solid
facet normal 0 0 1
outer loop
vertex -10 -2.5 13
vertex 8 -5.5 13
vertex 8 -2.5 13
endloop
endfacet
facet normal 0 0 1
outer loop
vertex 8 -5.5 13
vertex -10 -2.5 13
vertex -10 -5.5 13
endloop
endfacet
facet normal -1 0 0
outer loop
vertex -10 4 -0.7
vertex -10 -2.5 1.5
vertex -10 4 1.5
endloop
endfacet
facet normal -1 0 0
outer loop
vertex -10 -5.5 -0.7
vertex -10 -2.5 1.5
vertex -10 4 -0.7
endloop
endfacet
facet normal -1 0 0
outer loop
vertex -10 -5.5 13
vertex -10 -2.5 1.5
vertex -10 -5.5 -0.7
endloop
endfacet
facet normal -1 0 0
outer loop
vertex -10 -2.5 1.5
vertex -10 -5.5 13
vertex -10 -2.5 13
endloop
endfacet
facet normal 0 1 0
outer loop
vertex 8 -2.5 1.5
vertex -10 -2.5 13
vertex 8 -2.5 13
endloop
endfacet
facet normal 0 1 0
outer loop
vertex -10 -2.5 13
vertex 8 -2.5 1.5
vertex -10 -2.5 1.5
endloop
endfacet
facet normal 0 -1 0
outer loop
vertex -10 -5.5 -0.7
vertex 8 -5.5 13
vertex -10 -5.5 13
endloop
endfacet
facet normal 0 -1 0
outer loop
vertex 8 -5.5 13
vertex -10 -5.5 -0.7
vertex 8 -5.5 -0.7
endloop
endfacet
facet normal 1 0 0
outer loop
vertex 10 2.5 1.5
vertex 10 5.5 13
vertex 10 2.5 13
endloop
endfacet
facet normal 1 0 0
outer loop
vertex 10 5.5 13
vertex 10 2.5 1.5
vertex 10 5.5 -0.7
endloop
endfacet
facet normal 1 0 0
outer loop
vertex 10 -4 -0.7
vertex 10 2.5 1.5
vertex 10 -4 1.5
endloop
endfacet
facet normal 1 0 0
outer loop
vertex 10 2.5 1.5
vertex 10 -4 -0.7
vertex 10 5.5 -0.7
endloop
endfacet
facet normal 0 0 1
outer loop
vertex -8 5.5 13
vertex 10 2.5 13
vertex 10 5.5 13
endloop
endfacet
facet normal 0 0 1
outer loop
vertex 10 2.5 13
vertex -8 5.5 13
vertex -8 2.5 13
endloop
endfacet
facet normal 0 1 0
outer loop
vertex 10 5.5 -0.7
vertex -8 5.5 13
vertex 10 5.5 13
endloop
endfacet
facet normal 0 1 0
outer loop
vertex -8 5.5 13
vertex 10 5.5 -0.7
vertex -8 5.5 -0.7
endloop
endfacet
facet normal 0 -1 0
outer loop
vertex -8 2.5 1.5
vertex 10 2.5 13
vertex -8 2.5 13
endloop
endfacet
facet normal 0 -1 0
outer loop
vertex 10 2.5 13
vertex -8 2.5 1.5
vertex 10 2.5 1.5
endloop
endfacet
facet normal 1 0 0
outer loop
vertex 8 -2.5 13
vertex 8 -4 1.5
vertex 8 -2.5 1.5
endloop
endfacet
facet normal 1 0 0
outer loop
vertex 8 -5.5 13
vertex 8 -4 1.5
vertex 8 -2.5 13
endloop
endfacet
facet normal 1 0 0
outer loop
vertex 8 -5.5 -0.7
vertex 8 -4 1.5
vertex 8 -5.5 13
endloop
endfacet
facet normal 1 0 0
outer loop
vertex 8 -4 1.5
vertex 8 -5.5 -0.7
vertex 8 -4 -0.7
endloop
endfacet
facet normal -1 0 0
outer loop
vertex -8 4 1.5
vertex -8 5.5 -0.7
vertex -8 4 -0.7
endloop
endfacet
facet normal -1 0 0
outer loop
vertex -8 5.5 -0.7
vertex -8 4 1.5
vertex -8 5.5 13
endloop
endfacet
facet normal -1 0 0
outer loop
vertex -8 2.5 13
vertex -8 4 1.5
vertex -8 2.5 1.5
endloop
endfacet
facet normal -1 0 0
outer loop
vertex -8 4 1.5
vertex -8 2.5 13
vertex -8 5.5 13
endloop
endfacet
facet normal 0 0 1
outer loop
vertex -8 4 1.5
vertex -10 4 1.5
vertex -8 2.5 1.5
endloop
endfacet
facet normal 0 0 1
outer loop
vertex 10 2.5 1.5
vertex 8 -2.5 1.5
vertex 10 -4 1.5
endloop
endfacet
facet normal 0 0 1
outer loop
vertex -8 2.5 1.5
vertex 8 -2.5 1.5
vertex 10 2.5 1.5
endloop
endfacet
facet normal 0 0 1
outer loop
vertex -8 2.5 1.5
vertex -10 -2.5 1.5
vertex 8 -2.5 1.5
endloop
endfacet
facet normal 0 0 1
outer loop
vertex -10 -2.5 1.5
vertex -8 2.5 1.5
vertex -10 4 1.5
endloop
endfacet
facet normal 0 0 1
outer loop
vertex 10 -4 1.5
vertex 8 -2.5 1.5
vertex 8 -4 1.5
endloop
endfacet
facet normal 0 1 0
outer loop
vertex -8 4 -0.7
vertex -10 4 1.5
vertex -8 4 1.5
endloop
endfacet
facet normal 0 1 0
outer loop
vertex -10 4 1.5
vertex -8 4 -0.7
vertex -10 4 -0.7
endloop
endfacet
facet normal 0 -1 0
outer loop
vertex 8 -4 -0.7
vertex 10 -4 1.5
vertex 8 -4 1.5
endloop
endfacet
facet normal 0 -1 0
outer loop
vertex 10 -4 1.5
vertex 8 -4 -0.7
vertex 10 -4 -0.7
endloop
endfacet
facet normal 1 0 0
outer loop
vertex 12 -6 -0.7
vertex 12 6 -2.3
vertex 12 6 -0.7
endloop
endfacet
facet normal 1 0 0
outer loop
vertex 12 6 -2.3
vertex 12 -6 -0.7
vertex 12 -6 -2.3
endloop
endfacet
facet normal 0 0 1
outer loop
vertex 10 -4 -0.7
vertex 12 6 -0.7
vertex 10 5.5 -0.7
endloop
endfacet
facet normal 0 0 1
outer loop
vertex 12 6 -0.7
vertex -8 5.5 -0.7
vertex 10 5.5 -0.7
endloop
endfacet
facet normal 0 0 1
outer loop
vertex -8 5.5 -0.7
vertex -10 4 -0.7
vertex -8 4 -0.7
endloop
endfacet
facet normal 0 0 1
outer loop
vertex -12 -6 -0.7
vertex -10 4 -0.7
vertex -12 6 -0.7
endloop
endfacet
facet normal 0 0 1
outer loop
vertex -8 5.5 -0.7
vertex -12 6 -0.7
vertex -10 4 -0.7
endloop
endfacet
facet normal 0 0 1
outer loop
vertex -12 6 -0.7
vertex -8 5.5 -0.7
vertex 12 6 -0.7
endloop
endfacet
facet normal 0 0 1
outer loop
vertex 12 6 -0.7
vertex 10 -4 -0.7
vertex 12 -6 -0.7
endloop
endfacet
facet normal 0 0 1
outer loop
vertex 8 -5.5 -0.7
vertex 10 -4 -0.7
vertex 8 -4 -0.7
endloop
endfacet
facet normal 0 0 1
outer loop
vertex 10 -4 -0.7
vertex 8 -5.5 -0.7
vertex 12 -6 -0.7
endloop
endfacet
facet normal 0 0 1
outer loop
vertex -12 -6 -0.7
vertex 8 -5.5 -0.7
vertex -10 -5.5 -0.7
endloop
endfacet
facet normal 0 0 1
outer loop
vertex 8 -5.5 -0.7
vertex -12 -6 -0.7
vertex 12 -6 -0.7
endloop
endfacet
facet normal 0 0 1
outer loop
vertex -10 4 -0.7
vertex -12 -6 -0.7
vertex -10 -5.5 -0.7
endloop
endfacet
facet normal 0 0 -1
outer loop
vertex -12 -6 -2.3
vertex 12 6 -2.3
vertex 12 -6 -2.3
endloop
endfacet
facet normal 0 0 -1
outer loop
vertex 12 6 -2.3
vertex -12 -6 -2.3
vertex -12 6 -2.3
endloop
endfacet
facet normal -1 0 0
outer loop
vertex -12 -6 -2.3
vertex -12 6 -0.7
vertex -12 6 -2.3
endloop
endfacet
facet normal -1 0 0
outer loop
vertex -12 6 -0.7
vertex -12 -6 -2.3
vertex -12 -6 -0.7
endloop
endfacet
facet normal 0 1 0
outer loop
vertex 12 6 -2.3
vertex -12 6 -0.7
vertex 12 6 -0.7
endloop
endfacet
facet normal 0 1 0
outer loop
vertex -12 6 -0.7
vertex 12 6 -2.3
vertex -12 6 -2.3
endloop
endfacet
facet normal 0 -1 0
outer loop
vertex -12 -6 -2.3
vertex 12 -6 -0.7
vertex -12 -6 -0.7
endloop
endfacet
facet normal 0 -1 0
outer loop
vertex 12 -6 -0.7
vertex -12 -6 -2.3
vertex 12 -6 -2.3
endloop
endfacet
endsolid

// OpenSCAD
// Parameters
base_width = 20; //[10:40:1]
base_depth = 8; //[4:16:1]
base_height = 3; //[1.5:6:0.1]
gap_width = 5; //[2.5:10:0.1]
gap_height = 10; //[5:20:0.5]
stem_width = 3; //[1.5:6:0.1]
stem_wall = 2; //[1:4:0.1]
stem_overlap = 1; //[0.5:2:0.1]
hole_diameter = 2.2; //[1.1:4.4:0.1]
hole_spacing = 10; //[5:20:0.5]
hole_edge_margin = 3; //[1.5:6:0.1]
pcb_thickness = 1.6; //[0.8:3.2:0.1]
pcb_margin = 2; //[1:4:0.1]
pcb_overlap = 0.8; //[0.5:2:0.1]
gap_clearance_x = 0.5; //[0.2:1.5:0.1]
gap_clearance_y = 0.5; //[0.2:1.5:0.1]
gap_clearance_z = 0.5; //[0.2:1.5:0.1]

// Photo Interrupter - complete geometry
module photo_interrupter() {
  color([0.15, 0.15, 0.17]) {
    // Base Plate
    translate([0, 0, 0])
      cube([base_width, base_depth, base_height], center=true);

    // Sensor Stems
    union() {
      // Left Stem
      translate([-(base_width/2) + (stem_wall/2), -(gap_width/2) - (stem_width/2), (gap_height + base_height + stem_overlap)/2 - (base_height/2) + (stem_overlap/2)])
        cube([stem_wall, stem_width, gap_height + base_height + stem_overlap], center=true);
      // Right Stem
      translate([(base_width/2) - (stem_wall/2), (gap_width/2) + (stem_width/2), (gap_height + base_height + stem_overlap)/2 - (base_height/2) + (stem_overlap/2)])
        cube([stem_wall, stem_width, gap_height + base_height + stem_overlap], center=true);
      // Left Inner Stem
      translate([-(stem_wall/2), -(gap_width/2) - (stem_width/2), (gap_height + base_height + stem_overlap)/2 - (base_height/2) + (stem_overlap/2)])
        cube([base_width - stem_wall, stem_width, gap_height + base_height + stem_overlap], center=true);
      // Right Inner Stem
      translate([(stem_wall/2), (gap_width/2) + (stem_width/2), (gap_height + base_height + stem_overlap)/2 - (base_height/2) + (stem_overlap/2)])
        cube([base_width - stem_wall, stem_width, gap_height + base_height + stem_overlap], center=true);
    }

    // U-Slot Gap
    difference() {
      cube([base_width, base_depth, base_height], center=true);
      translate([0, 0, (gap_height + base_height)/2 - (base_height/2)])
        cube([base_width + 2*gap_clearance_x, gap_width + 2*gap_clearance_y, gap_height + base_height + 2*gap_clearance_z], center=true);
    }

    // Mounting Holes
    difference() {
      cube([base_width, base_depth, base_height], center=true);
      translate([-(hole_spacing/2), 0, 0])
        cylinder(h=base_height + 2*gap_clearance_z, r=hole_diameter/2, center=true);
      translate([(hole_spacing/2), 0, 0])
        cylinder(h=base_height + 2*gap_clearance_z, r=hole_diameter/2, center=true);
    }
  }

  // PCB
  color([0.0, 0.4, 0.2]) {
    translate([0, 0, -(base_height/2) - (pcb_thickness/2) + pcb_overlap])
      cube([base_width + 2*pcb_margin, base_depth + 2*pcb_margin, pcb_thickness], center=true);
  }
}

// Assembly
module assembly() {
  photo_interrupter();
}

assembly();
